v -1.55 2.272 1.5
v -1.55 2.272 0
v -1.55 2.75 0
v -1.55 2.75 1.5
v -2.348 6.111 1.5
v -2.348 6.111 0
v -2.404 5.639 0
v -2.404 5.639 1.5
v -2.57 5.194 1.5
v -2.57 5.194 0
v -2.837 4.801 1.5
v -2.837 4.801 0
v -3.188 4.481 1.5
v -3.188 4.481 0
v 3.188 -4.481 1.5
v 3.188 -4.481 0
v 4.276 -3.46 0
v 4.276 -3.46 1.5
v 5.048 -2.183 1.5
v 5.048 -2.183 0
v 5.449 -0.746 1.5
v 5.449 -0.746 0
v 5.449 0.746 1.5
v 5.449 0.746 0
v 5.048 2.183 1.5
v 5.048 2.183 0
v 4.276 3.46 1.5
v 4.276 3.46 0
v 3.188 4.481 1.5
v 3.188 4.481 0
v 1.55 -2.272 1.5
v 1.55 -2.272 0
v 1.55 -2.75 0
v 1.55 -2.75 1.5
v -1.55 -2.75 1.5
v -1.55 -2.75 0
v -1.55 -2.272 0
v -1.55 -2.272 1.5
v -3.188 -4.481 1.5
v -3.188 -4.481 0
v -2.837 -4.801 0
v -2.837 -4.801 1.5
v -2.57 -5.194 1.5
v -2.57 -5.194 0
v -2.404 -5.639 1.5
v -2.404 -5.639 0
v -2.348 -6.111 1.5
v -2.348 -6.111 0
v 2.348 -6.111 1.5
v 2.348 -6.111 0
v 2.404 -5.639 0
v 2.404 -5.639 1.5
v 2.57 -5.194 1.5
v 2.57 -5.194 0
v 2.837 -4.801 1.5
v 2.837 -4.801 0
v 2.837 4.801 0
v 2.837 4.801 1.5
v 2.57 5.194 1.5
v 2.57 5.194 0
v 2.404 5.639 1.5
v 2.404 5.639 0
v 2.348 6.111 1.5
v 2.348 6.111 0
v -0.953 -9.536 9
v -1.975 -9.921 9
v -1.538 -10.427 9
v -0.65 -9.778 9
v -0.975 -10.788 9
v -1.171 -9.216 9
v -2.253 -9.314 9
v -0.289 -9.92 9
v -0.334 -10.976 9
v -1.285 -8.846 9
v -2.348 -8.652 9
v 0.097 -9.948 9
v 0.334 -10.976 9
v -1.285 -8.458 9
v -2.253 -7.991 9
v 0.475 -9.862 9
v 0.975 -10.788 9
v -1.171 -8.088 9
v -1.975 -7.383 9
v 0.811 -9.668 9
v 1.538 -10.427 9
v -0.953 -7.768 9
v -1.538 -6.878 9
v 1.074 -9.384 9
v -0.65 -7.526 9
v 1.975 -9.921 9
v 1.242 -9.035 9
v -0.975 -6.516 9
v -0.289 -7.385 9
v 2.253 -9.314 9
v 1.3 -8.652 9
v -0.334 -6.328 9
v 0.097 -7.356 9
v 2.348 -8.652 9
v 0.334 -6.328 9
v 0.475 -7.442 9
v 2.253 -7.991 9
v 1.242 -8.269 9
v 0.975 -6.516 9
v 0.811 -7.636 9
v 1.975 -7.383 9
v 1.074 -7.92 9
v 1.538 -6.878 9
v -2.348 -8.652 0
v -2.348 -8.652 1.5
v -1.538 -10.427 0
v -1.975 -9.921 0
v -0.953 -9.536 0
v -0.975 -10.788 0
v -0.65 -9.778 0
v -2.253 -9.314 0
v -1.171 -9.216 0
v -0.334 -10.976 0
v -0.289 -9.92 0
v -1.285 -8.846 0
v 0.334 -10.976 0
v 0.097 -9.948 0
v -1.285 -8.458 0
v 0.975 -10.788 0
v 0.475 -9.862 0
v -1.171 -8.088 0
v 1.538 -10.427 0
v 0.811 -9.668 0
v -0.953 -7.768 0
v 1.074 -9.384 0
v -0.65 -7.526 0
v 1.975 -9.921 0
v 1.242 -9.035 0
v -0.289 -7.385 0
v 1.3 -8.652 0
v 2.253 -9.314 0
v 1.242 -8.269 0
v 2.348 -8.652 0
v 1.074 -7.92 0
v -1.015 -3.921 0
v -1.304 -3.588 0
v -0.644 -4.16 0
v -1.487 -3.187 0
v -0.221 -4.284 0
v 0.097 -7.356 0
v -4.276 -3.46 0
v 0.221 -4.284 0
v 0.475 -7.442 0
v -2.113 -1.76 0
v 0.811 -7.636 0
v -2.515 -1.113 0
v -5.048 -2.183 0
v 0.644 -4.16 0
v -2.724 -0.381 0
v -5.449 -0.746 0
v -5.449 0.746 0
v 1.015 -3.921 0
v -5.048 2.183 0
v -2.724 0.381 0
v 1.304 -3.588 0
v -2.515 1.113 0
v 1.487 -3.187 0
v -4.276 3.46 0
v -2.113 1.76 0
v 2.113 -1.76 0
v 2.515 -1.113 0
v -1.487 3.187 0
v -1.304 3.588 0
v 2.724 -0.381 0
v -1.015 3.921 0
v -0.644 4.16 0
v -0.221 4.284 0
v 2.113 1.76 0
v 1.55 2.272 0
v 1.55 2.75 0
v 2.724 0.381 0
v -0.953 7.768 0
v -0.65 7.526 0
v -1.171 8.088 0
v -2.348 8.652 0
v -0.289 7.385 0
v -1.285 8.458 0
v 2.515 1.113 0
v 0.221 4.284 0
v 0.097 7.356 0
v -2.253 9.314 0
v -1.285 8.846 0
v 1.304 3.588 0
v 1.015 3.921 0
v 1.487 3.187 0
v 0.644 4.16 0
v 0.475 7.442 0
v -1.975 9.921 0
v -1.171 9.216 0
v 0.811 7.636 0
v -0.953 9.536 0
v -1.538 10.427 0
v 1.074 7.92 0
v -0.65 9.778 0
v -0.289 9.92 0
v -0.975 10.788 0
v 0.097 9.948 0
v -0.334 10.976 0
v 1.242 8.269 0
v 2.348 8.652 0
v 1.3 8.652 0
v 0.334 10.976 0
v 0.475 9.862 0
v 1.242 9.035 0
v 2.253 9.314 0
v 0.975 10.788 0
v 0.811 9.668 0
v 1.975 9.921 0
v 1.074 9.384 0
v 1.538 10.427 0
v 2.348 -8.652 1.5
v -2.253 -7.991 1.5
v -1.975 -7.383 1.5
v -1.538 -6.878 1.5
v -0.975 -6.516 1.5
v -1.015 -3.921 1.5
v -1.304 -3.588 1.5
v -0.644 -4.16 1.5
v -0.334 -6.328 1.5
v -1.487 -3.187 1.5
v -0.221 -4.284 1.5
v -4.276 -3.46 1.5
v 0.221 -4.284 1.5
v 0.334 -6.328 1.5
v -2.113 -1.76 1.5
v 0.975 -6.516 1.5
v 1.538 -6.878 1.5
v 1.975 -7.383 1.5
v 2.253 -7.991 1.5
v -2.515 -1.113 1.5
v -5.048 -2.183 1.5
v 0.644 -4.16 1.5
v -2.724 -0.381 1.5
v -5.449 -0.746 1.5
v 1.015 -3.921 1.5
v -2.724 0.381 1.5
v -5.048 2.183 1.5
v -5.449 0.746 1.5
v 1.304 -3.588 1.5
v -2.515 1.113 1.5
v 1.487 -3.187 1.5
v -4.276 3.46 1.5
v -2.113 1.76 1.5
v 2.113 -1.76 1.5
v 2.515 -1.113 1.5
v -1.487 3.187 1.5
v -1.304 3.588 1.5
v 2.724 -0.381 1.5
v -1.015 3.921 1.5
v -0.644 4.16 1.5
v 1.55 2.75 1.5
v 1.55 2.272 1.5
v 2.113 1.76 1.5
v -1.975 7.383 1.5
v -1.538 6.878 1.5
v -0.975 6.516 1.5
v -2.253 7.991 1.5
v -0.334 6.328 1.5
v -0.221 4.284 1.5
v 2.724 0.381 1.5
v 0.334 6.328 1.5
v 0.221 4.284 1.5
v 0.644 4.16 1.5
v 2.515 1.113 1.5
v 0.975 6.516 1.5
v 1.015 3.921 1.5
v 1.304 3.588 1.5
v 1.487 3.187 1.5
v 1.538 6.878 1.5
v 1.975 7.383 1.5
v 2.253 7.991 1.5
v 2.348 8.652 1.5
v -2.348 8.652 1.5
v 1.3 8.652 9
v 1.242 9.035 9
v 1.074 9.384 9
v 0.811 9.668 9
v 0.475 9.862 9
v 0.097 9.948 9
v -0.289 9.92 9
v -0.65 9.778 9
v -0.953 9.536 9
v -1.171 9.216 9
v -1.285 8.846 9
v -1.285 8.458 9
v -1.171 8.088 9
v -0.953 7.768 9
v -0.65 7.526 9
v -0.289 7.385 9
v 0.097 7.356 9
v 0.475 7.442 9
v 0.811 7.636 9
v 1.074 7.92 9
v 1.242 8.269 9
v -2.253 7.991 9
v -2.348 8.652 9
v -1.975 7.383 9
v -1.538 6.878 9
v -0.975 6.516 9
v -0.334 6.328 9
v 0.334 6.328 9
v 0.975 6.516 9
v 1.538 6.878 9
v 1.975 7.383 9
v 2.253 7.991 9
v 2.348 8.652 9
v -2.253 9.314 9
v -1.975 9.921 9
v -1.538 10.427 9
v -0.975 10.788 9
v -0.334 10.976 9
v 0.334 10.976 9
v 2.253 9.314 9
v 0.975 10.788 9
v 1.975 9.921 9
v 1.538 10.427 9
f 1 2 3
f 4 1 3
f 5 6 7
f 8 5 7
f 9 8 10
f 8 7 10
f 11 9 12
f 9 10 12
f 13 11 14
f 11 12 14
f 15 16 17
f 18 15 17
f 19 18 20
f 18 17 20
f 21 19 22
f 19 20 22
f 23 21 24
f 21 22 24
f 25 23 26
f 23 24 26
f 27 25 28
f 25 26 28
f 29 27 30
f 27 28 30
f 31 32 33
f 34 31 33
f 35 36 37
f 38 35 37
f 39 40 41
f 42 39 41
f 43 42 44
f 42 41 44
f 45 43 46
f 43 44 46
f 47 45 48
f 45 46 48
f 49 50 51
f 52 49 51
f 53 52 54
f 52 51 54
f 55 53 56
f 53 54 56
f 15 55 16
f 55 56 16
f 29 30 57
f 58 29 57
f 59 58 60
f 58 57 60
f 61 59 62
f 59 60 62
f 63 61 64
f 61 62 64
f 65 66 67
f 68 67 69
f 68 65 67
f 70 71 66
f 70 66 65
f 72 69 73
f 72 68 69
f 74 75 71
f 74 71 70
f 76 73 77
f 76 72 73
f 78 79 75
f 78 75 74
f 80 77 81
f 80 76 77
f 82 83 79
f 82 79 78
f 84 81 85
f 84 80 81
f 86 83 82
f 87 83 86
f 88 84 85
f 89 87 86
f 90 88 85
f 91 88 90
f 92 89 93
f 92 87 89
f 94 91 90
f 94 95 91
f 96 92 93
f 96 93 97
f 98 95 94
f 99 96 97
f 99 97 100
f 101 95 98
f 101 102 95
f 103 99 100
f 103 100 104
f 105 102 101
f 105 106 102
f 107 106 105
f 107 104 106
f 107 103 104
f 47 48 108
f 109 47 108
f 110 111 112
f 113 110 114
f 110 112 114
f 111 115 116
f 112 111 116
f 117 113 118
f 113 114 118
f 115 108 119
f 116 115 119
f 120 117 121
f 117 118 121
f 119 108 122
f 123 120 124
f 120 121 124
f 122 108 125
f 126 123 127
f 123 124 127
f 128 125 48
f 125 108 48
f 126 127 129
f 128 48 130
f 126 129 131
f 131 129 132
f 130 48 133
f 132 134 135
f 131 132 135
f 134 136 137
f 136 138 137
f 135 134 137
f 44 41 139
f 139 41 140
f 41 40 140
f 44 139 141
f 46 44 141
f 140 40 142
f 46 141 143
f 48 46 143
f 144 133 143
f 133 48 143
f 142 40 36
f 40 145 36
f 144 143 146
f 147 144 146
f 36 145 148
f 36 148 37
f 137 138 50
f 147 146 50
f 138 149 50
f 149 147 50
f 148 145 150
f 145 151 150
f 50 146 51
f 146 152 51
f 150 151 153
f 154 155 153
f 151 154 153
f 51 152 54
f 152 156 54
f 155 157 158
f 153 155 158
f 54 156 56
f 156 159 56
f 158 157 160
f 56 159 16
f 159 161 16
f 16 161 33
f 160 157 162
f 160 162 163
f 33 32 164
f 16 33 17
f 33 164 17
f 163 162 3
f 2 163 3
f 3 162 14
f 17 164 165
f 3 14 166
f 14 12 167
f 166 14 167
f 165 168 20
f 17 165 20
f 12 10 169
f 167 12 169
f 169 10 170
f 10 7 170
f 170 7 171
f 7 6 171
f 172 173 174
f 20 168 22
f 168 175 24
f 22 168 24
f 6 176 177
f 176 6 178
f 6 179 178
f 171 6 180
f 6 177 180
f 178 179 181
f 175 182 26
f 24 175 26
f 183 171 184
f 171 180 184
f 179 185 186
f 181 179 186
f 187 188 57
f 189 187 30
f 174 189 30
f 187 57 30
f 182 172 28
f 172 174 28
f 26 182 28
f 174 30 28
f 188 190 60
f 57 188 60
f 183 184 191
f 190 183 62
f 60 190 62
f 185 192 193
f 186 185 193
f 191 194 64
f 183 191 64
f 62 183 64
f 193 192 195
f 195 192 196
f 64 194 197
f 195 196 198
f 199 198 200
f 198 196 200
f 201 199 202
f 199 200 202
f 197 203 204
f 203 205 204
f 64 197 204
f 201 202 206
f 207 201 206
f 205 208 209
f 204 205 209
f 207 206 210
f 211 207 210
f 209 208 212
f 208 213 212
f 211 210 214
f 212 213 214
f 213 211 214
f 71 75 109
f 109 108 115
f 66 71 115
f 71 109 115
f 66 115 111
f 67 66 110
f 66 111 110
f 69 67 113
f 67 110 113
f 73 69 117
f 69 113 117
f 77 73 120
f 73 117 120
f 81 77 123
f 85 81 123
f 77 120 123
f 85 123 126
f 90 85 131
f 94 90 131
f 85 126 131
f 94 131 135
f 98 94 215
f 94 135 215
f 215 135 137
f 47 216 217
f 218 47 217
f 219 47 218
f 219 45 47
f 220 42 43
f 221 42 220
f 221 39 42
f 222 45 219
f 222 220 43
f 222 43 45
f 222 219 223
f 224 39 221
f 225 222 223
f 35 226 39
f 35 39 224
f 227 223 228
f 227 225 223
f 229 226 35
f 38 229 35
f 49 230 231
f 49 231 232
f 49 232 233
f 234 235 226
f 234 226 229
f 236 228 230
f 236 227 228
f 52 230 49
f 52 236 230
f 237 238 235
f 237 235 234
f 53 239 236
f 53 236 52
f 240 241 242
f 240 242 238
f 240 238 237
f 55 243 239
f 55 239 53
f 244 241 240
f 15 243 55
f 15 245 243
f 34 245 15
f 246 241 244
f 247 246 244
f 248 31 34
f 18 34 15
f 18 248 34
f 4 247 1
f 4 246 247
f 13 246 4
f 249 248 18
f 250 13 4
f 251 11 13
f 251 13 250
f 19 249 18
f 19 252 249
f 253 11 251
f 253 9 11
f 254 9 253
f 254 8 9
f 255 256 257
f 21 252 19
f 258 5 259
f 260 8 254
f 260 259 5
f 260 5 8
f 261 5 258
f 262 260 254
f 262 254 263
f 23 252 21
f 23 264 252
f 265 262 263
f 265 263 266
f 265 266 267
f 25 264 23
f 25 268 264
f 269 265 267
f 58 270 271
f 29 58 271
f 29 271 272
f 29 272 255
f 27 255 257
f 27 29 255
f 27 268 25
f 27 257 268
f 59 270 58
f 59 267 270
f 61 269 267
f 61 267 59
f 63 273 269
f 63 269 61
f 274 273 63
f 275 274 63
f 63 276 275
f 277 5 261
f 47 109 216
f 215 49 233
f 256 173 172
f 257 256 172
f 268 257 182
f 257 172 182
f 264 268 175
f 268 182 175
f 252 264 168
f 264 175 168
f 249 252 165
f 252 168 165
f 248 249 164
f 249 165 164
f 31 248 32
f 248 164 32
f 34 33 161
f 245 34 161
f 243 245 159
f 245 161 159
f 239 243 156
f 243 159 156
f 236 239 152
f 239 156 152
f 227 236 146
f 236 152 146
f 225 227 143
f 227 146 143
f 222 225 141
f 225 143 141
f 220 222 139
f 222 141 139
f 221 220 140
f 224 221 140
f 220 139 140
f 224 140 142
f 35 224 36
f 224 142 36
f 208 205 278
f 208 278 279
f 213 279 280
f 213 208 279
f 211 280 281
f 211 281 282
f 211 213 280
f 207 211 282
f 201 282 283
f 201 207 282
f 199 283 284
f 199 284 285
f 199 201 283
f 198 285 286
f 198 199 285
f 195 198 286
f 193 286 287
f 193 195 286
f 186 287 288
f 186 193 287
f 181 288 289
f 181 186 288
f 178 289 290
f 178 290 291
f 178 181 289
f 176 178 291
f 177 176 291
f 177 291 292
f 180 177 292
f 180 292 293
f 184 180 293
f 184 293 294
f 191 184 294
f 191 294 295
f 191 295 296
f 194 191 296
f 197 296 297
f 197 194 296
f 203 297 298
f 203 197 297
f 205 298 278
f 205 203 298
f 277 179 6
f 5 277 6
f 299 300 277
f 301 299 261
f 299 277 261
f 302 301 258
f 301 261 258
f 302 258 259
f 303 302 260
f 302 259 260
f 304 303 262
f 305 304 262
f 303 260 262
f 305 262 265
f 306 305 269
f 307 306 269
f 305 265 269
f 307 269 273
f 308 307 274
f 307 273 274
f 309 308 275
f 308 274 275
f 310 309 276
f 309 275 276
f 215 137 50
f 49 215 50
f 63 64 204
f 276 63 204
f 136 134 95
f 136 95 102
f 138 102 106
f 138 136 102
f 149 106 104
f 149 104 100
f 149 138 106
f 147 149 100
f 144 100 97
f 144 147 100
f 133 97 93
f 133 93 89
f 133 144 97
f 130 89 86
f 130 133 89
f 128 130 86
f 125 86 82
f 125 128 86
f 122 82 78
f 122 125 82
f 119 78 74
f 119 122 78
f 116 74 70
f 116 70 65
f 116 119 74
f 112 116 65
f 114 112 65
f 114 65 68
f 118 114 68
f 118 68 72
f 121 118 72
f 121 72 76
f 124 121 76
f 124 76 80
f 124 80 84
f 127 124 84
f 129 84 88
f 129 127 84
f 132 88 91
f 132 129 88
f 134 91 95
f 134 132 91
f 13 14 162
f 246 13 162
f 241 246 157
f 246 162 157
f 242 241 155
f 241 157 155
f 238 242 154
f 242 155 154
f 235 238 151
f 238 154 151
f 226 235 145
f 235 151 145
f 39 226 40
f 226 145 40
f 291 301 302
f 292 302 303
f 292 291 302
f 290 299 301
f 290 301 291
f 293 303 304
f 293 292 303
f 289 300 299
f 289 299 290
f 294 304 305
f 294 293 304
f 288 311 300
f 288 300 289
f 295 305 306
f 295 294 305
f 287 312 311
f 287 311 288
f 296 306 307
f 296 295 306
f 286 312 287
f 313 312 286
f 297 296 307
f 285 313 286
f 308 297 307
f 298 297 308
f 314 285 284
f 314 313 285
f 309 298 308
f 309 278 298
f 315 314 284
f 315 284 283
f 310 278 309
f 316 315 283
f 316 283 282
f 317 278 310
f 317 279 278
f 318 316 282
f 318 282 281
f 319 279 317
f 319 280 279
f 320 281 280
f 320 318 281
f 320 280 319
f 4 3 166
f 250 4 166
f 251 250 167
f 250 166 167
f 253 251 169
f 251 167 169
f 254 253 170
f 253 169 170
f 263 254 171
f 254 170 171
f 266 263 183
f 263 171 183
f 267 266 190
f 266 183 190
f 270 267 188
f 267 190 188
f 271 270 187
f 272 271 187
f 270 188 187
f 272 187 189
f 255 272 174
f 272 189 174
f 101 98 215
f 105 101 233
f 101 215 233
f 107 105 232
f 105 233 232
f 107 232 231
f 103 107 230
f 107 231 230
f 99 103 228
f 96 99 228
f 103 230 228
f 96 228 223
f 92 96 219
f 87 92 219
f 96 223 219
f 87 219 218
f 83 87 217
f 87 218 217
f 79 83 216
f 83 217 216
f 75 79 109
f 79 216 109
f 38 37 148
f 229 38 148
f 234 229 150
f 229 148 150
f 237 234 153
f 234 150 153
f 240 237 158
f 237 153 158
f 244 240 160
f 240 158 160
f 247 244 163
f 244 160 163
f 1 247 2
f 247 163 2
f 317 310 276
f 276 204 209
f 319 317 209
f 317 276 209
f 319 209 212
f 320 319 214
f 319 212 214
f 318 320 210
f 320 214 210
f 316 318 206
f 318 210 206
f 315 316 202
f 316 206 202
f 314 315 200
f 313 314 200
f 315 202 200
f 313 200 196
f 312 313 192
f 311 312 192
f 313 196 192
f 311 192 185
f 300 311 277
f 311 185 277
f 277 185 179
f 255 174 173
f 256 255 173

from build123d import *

# Parameters (mm, degrees)
EXTRUDE_1_DEPTH = 1.5
SKETCH_1_4_R    = 2.347892547
SKETCH_1_4_R_2  = 1.3
EXTRUDE_2_DEPTH = 9


with BuildPart() as part:
    # 草图1 → 凸台-拉伸1 (new body)
    with BuildSketch(Plane.XY):
        with BuildLine():
            ThreePointArc((3.188454535, 4.481490565), (2.570411742, 5.19430182), (2.347892547, 6.111123497))
            Line((2.347892547, 6.111123497), (2.347892547, 8.652107453))
            ThreePointArc((2.347892547, 8.652107453), (0, 6.304214905), (-2.347892547, 8.652107453))
            Line((-2.347892547, 8.652107453), (-2.347892547, 6.111123497))
            ThreePointArc((-2.347892547, 6.111123497), (-2.570411742, 5.19430182), (-3.188454535, 4.481490565))
            ThreePointArc((-3.188454535, 4.481490565), (-5.5, 0), (-3.188454535, -4.481490565))
            ThreePointArc((-3.188454535, -4.481490565), (-2.570411742, -5.19430182), (-2.347892547, -6.111123497))
            Line((-2.347892547, -6.111123497), (-2.347892547, -8.652107453))
            ThreePointArc((-2.347892547, -8.652107453), (0, -6.304214905), (2.347892547, -8.652107453))
            Line((2.347892547, -8.652107453), (2.347892547, -6.111123497))
            ThreePointArc((2.347892547, -6.111123497), (2.570411742, -5.19430182), (3.188454535, -4.481490565))
            ThreePointArc((3.188454535, -4.481490565), (5.5, 0), (3.188454535, 4.481490565))
        make_face()
        with BuildLine():
            ThreePointArc((1.55, -2.75), (0, -4.3), (-1.55, -2.75))
            Line((-1.55, -2.75), (-1.55, -2.271563338))
            ThreePointArc((-1.55, -2.271563338), (-2.75, 0), (-1.55, 2.271563338))
            Line((-1.55, 2.271563338), (-1.55, 2.75))
            ThreePointArc((-1.55, 2.75), (0, 4.3), (1.55, 2.75))
            Line((1.55, 2.75), (1.55, 2.271563338))
            ThreePointArc((1.55, 2.271563338), (2.75, 0), (1.55, -2.271563338))
            Line((1.55, -2.271563338), (1.55, -2.75))
        make_face(mode=Mode.SUBTRACT)
    extrude(amount=EXTRUDE_1_DEPTH)

    # 草图1<4> → 凸台-拉伸2 (add)
    # profile 1 of 2: a face of its own
    with BuildSketch(Plane.XY):
        with Locations((0, 8.652107453)):
            Circle(SKETCH_1_4_R)
        with Locations((0, 8.652107453)):
            Circle(SKETCH_1_4_R_2, mode=Mode.SUBTRACT)
    # profile 2 of 2: a face of its own
    with BuildSketch(Plane.XY):
        with Locations((0, -8.652107453)):
            Circle(SKETCH_1_4_R)
        with Locations((0, -8.652107453)):
            Circle(SKETCH_1_4_R_2, mode=Mode.SUBTRACT)
    extrude(amount=EXTRUDE_2_DEPTH)


solid = part.part
